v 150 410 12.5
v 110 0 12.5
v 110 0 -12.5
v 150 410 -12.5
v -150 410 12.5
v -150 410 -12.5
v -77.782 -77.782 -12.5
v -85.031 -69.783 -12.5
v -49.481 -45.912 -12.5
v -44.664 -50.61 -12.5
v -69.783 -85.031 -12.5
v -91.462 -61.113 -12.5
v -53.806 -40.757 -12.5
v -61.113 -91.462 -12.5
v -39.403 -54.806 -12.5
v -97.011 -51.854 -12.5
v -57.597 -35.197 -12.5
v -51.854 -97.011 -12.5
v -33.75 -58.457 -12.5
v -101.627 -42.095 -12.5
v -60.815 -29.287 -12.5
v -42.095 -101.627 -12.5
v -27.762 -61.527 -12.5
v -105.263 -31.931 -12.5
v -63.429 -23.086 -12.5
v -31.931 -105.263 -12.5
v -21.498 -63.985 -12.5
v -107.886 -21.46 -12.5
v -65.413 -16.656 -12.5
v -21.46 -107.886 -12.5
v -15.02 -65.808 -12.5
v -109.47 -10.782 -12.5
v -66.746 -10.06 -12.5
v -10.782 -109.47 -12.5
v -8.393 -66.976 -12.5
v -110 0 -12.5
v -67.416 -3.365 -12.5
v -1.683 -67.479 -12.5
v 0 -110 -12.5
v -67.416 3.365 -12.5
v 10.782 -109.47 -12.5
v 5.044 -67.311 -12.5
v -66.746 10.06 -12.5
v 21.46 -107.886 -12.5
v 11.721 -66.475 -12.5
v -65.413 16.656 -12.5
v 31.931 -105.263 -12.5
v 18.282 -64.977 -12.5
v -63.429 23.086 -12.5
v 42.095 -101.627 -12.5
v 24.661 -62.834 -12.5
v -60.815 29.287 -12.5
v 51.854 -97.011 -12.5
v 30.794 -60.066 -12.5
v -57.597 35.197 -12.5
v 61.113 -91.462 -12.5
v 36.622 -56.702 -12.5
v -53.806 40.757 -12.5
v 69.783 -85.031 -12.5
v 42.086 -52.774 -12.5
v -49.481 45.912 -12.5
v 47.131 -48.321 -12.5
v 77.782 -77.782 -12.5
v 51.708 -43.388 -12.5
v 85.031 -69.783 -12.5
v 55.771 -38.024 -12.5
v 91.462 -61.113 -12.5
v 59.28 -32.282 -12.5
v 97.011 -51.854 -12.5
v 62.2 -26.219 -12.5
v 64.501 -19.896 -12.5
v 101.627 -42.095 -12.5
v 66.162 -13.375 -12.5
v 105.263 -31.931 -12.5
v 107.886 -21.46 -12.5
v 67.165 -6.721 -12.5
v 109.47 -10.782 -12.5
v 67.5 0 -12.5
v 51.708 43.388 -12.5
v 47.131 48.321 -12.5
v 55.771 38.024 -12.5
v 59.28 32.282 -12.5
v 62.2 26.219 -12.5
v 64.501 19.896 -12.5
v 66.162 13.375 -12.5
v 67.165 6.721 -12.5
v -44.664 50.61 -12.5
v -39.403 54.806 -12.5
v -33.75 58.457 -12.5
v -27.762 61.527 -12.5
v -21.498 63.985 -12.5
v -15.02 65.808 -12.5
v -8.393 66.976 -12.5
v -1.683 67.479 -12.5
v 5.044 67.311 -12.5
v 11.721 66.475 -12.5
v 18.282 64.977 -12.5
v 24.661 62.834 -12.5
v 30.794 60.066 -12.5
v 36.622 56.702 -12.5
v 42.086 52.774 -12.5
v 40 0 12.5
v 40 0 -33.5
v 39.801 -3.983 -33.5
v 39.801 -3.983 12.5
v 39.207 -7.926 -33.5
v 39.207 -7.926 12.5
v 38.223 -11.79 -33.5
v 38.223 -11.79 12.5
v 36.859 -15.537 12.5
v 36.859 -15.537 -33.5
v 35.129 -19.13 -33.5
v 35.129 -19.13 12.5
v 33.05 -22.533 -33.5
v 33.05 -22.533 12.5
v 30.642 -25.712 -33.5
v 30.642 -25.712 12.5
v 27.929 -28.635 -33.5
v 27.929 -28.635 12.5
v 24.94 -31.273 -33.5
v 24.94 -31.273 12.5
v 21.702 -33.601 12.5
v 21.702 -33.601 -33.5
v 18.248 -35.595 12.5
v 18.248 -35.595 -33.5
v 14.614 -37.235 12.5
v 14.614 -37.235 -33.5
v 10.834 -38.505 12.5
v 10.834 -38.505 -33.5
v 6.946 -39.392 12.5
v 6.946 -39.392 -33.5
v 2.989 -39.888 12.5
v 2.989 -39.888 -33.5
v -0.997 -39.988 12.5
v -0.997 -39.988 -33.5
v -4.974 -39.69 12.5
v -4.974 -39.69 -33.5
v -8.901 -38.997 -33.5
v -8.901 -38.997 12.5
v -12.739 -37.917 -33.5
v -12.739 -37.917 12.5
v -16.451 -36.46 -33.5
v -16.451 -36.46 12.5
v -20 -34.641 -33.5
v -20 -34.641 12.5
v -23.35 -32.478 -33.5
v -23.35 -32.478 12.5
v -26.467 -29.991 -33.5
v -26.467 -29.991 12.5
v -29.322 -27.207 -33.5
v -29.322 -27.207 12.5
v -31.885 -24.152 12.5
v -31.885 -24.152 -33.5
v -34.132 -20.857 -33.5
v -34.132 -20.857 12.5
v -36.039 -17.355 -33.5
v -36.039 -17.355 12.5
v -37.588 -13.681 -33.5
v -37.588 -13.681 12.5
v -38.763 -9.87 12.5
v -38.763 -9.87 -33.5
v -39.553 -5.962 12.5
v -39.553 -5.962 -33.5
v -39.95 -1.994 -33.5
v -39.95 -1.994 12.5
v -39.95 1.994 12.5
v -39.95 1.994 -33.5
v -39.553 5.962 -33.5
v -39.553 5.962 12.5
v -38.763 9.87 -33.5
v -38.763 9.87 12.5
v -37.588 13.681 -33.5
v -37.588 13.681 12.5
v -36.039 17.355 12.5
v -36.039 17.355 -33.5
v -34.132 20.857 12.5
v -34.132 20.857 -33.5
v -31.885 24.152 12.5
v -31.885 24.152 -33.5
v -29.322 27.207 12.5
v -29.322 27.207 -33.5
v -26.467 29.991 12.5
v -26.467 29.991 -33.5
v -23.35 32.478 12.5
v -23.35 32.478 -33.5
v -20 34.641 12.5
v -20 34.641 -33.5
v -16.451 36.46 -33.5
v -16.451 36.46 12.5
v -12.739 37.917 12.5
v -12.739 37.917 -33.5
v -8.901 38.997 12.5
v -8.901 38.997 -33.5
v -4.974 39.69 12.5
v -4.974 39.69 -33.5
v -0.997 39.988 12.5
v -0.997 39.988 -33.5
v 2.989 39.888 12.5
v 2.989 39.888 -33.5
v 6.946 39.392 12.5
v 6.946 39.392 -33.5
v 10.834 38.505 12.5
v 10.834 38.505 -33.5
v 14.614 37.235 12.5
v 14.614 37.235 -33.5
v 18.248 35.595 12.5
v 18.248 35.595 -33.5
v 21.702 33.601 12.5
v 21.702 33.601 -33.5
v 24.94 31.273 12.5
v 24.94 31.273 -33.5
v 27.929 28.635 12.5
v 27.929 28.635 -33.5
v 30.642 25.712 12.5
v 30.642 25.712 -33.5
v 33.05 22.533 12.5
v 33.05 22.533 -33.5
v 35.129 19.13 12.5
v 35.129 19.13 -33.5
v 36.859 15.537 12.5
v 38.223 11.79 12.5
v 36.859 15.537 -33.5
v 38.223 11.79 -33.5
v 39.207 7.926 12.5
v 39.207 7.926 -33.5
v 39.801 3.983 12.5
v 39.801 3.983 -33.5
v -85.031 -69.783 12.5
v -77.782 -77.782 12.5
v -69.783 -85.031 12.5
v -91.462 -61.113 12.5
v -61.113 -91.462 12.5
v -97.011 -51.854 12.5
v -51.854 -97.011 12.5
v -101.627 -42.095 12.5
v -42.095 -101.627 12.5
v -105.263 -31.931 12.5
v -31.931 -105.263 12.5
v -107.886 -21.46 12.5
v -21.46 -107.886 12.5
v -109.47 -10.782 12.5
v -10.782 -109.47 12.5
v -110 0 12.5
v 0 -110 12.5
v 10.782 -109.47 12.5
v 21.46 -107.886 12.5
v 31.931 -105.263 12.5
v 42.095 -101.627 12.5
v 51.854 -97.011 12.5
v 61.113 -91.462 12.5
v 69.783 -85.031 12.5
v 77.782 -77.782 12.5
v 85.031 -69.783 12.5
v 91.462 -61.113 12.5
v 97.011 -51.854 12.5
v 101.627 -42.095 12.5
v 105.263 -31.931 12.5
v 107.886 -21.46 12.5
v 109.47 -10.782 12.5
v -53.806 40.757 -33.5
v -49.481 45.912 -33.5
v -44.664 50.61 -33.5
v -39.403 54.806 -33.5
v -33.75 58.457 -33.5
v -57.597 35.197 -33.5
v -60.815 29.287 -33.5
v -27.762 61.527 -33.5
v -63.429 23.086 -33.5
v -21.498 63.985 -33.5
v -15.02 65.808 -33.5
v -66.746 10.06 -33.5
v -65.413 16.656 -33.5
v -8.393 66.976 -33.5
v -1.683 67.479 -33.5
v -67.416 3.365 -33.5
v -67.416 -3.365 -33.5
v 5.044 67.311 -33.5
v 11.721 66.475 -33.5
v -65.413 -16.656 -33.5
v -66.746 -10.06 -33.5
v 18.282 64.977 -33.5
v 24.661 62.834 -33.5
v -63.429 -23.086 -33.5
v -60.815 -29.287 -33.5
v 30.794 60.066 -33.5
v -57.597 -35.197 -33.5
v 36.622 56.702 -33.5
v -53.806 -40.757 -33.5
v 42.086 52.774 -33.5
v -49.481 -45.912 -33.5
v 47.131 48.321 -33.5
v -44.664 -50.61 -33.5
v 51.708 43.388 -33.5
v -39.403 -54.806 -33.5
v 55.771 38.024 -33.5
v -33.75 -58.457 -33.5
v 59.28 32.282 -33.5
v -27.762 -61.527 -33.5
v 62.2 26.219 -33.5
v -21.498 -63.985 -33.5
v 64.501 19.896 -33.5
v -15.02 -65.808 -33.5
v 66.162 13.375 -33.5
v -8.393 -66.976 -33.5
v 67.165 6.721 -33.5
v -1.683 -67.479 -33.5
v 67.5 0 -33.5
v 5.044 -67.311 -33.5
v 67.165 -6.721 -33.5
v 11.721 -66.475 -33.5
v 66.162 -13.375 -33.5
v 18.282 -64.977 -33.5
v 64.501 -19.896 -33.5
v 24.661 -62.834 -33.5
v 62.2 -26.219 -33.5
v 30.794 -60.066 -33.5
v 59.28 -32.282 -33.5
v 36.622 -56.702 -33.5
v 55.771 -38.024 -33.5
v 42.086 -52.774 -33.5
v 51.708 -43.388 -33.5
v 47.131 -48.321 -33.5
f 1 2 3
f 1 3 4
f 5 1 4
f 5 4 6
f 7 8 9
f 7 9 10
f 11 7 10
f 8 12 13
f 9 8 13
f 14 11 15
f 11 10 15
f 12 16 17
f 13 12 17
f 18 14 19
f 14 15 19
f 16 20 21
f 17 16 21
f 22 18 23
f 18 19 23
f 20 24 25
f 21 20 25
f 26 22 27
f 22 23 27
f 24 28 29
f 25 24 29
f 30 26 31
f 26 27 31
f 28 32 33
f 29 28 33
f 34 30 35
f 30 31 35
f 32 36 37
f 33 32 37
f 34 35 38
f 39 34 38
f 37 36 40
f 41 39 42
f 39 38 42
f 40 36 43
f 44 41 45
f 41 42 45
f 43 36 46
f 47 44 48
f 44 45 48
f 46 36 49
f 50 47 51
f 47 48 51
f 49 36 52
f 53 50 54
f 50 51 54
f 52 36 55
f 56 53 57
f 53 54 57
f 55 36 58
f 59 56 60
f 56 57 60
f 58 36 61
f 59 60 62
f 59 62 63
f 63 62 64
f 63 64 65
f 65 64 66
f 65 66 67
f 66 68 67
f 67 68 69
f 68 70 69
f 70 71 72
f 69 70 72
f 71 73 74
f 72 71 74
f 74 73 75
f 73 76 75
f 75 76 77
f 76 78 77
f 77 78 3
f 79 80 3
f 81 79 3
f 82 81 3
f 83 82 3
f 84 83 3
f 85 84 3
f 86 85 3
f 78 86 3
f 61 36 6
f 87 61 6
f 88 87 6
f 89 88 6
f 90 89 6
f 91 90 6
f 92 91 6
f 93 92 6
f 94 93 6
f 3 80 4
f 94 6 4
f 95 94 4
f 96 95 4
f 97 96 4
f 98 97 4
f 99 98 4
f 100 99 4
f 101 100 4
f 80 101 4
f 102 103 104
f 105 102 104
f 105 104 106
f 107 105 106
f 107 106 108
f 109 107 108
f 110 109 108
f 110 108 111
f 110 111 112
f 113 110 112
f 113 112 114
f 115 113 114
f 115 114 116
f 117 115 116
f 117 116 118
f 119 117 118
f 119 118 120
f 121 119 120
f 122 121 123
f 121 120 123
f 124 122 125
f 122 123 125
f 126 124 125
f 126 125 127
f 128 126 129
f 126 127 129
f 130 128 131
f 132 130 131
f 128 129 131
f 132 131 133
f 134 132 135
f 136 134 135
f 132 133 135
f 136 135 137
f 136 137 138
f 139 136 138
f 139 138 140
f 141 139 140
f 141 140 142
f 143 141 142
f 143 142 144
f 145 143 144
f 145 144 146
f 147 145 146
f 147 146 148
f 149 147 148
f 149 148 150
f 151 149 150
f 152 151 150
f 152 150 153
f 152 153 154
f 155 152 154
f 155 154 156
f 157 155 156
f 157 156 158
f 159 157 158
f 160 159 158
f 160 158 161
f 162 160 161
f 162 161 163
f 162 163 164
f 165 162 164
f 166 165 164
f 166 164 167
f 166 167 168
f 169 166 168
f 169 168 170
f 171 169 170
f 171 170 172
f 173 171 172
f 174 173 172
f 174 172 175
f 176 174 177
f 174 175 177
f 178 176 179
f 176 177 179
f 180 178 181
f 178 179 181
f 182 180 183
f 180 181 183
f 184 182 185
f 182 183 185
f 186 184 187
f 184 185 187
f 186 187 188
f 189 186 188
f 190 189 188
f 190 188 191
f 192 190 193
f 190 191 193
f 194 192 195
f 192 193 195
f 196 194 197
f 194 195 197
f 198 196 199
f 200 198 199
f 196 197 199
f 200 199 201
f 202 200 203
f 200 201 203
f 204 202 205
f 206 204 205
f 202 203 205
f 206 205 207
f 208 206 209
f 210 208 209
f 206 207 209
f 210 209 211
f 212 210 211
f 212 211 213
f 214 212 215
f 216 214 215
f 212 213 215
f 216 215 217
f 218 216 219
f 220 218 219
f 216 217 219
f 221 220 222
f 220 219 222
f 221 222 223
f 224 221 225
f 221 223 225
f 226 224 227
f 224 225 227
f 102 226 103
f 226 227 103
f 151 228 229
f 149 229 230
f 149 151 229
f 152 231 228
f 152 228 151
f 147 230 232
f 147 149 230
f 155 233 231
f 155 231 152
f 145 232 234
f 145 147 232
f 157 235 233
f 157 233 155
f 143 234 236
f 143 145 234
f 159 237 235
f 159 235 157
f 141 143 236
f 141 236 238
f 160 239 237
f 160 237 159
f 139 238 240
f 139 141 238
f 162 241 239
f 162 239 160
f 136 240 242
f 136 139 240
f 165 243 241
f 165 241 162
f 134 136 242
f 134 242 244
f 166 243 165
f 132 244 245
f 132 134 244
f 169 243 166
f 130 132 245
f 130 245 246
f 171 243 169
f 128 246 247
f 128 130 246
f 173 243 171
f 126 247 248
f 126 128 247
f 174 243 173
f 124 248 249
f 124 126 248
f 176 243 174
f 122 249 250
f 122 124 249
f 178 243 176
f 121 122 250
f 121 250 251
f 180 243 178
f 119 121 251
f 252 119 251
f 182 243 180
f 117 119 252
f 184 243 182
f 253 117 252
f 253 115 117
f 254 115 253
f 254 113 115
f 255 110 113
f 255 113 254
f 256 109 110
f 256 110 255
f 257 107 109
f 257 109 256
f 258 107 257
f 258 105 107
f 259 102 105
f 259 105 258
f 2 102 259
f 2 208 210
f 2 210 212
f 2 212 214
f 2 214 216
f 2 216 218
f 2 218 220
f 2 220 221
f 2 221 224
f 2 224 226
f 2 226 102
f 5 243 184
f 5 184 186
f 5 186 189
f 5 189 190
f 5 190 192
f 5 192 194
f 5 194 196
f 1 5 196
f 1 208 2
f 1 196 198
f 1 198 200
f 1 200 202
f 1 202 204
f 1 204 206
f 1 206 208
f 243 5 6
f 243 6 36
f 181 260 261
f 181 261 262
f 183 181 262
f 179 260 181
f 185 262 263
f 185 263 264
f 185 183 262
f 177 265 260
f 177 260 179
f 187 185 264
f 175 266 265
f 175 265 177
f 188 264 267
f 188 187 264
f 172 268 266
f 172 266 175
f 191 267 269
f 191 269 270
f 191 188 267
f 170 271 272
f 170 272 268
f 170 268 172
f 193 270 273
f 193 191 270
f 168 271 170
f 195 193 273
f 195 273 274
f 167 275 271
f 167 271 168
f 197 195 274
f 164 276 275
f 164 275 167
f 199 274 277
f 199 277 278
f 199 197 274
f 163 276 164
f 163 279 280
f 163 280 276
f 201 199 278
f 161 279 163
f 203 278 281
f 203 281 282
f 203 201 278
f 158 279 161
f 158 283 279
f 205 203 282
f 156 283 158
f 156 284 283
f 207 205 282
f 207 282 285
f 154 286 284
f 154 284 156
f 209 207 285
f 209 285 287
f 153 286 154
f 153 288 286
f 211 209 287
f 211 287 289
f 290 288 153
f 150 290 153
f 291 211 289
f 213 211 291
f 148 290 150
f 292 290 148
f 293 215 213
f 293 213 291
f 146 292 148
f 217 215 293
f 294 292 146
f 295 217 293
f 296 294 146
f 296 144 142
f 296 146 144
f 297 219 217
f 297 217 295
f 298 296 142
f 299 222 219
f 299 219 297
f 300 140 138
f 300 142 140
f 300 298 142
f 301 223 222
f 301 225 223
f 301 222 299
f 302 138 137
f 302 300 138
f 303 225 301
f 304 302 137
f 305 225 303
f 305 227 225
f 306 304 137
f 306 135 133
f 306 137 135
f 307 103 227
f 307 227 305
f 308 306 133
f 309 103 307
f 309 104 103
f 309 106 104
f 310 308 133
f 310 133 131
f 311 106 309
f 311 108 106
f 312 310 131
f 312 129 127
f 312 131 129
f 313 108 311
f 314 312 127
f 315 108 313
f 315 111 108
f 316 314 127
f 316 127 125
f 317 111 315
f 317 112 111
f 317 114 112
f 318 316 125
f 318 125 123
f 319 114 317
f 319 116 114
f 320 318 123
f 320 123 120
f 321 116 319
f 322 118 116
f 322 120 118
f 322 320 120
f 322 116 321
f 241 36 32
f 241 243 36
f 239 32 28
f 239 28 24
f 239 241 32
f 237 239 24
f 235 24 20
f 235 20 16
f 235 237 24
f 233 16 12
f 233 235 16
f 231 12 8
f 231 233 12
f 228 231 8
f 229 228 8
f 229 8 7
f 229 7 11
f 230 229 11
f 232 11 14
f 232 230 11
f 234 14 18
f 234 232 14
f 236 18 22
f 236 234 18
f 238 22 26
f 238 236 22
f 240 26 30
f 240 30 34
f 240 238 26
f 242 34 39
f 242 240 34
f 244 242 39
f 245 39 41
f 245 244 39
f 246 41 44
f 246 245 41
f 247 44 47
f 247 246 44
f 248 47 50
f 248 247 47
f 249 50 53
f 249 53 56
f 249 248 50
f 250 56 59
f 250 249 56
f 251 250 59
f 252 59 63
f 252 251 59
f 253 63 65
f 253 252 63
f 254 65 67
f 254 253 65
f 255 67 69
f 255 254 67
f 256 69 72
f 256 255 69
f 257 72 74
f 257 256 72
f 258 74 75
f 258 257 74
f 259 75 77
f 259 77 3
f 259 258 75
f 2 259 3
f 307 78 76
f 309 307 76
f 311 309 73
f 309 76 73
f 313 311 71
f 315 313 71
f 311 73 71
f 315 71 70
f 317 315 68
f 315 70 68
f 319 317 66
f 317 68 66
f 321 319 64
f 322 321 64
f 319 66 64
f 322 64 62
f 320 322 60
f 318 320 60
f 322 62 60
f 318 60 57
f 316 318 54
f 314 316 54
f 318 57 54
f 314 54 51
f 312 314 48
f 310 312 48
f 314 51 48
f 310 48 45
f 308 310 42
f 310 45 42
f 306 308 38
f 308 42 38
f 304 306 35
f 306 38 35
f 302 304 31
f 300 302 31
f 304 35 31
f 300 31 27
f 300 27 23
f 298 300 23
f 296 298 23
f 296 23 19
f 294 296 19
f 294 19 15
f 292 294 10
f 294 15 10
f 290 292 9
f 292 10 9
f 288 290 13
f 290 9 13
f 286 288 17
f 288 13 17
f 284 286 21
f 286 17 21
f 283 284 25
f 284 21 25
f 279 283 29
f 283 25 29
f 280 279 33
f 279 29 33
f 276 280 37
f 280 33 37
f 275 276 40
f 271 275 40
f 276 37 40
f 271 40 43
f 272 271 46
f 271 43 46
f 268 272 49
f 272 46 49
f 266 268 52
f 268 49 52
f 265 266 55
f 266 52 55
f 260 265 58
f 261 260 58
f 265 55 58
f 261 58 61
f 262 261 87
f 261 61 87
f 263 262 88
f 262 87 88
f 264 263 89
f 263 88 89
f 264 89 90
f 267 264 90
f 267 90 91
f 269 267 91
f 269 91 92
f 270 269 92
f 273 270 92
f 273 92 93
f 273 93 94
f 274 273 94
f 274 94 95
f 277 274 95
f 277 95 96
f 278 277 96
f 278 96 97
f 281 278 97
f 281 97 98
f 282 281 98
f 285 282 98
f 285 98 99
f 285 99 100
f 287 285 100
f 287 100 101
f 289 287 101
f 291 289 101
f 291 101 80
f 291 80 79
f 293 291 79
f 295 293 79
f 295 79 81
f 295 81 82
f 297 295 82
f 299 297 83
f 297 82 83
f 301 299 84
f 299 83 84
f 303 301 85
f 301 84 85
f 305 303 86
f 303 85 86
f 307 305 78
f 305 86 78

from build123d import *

# Parameters (mm, degrees)
F0_R     = 110
F1_DEPTH = 12.5
F3_DEPTH = 25
F4_R     = 67.5
F5_DEPTH = 21
F6_R     = 40
F7_DEPTH = 60


with BuildPart() as f1:
    # F0 (on Top) → F1 (new body, symmetric)
    with BuildSketch(Plane.XY):
        Circle(F0_R)
    extrude(amount=F1_DEPTH, both=True)

    # F2 (on face) → F3 (join)
    with BuildSketch(Plane.XY.offset(12.5)):
        Polygon((-110, 0), (110, 0), (150, 410), (-150, 410), align=None)
    extrude(amount=-F3_DEPTH)

    # F4 (on face) → F5 (join)
    with BuildSketch(Plane(origin=(0, 0, -12.5), x_dir=(1, 0, 0), z_dir=(0, 0, -1))):
        Circle(F4_R)
    extrude(amount=F5_DEPTH)

    # F6 (on face) → F7 (cut)
    with BuildSketch(Plane(origin=(0, 0, -33.5), x_dir=(1, 0, 0), z_dir=(0, 0, -1))):
        Circle(F6_R)
    extrude(amount=-F7_DEPTH, mode=Mode.SUBTRACT)


solid = f1.part
